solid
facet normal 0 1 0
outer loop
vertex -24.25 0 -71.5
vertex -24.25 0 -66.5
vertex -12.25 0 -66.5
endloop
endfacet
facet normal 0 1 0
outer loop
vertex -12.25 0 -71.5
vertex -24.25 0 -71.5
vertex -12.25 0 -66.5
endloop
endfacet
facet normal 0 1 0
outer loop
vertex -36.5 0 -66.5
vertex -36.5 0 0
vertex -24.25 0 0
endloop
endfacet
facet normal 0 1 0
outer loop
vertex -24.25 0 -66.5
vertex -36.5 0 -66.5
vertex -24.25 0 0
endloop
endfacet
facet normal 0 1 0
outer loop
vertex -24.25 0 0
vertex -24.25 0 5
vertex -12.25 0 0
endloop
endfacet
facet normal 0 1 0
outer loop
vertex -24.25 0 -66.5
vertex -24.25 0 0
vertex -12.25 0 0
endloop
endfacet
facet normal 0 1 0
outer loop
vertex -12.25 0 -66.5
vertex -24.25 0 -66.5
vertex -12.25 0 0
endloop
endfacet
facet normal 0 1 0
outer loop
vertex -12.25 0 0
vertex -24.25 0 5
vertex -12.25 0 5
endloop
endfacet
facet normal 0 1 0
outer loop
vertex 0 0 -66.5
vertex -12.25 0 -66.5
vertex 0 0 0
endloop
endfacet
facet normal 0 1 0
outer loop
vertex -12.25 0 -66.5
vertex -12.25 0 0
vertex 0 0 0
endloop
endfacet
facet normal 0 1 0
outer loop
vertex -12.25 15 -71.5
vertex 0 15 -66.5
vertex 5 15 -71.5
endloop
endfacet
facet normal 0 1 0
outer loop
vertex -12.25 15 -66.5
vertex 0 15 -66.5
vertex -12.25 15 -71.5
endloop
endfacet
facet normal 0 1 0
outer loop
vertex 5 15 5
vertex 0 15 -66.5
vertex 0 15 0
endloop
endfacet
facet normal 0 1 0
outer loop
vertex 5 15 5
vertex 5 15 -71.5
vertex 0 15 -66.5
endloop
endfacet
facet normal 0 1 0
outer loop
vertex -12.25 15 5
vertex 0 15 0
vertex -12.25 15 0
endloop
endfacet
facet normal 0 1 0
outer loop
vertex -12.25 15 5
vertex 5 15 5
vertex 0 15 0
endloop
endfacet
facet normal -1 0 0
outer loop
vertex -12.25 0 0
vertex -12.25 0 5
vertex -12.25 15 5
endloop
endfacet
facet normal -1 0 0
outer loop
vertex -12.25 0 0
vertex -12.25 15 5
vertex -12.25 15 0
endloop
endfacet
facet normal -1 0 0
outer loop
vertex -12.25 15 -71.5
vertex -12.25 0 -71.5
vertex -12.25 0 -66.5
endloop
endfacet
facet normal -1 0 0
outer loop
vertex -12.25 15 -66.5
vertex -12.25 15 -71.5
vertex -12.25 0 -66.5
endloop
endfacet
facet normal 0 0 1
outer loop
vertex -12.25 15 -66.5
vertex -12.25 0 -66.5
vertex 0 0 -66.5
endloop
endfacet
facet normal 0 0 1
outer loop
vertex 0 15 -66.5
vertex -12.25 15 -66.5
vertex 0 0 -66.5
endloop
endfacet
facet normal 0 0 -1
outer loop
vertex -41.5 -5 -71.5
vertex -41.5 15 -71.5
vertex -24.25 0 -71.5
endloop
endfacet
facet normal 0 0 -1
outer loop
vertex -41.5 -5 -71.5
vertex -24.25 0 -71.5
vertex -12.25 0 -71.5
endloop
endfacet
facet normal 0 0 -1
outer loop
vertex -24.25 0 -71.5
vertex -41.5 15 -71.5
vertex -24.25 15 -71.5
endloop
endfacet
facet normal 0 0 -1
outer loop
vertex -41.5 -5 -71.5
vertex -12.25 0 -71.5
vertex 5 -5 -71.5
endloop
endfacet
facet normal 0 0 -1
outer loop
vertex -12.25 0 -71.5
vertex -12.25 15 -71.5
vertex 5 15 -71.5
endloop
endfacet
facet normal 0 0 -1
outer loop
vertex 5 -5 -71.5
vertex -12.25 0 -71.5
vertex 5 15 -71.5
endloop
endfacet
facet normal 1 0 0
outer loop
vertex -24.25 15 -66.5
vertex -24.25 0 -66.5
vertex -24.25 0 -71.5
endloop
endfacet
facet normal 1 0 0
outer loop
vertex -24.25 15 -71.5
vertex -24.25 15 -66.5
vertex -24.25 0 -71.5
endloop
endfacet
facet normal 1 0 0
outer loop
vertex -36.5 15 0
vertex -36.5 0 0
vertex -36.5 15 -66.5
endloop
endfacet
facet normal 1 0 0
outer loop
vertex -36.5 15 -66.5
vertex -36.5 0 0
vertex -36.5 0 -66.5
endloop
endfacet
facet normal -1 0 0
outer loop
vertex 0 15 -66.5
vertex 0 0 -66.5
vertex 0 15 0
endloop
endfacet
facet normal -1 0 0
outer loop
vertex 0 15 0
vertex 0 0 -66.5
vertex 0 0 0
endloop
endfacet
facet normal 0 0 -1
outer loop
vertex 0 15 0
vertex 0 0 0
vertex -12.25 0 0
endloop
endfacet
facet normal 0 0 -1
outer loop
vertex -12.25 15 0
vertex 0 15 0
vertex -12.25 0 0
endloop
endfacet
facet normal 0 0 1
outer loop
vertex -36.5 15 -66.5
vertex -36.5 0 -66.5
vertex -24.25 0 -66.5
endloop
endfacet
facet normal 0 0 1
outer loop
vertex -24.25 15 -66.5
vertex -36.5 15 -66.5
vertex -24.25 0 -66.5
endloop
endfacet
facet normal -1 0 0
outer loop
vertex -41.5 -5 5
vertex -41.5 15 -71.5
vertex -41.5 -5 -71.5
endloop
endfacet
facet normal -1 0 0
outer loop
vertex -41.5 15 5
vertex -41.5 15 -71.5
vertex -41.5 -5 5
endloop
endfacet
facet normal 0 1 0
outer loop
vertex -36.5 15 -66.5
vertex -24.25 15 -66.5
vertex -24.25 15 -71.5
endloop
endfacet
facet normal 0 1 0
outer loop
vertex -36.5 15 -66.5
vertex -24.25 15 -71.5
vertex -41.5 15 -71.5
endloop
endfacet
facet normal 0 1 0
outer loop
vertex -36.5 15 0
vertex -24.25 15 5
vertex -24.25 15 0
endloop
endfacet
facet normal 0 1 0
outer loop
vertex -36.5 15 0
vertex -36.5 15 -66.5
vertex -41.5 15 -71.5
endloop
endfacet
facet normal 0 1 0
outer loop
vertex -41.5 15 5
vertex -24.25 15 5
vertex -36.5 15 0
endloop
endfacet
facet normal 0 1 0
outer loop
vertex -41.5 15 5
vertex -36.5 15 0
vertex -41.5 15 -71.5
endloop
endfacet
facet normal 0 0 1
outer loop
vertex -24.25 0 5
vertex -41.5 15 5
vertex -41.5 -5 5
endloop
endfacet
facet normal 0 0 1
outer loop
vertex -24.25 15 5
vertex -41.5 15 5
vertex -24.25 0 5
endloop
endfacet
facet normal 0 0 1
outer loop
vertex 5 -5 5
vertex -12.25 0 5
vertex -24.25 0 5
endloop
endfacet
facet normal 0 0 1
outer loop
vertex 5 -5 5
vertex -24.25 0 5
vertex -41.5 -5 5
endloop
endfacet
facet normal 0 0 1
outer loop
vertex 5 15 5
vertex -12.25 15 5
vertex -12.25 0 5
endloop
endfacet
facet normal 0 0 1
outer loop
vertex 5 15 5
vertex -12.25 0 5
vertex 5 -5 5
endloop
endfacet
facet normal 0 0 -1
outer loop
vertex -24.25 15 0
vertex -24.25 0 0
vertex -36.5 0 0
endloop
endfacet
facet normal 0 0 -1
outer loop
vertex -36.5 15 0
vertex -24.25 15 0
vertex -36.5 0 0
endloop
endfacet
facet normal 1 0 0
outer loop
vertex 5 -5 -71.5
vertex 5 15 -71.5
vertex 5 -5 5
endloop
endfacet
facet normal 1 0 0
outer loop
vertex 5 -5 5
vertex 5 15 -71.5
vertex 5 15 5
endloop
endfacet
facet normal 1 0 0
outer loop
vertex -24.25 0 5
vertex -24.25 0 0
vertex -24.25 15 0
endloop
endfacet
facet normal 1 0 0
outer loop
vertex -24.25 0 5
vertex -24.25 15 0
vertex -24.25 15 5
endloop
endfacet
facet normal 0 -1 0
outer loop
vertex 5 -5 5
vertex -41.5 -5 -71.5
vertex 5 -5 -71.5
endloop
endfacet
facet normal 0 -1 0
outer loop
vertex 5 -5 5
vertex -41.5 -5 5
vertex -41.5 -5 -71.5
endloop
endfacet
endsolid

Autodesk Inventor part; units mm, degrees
ref_plane "YZ Plane" through (0, 0, 0) normal (1, 0, 0) x (0, 1, 0)
ref_plane "XZ Plane" through (0, 0, 0) normal (0, 1, 0) x (-1, 0, 0)
ref_plane "XY Plane" through (0, 0, 0) normal (0, 0, 1) x (1, 0, 0)
sketch "Sketch1" plane through (0, 0, 0) normal (0, 1, 0) x (-1, 0, 0)
  line L0 (0, 0) -> (36.5, 0)
  line L1 (36.5, 0) -> (36.5, -66.5)
  line L2 (36.5, -66.5) -> (0, -66.5)
  line L3 (0, -66.5) -> (0, 0)
  line L4 (41.5, 5) -> (-5, 5)
  line L5 (-5, 5) -> (-5, -71.5)
  line L6 (-5, -71.5) -> (41.5, -71.5)
  line L7 (41.5, -71.5) -> (41.5, 5)
  line L8 (18.25, 5) -> (24.25, 5)
  line L9 (18.25, -71.5) -> (24.25, -71.5)
  line L10 (24.25, 5) -> (12.25, 5)
  line L11 (12.25, 5) -> (12.25, 0)
  line L12 (12.25, 0) -> (24.25, 0)
  line L13 (24.25, 0) -> (24.25, 5)
  line L14 (24.25, -71.5) -> (12.25, -71.5)
  line L15 (12.25, -71.5) -> (12.25, -66.5)
  line L16 (12.25, -66.5) -> (24.25, -66.5)
  line L17 (24.25, -66.5) -> (24.25, -71.5)
  dimension "d0" = 36.5
  dimension "d1" = 66.5
  dimension "d2" = 5
  dimension "d3" = 6
  dimension "d4" = 6
  dimension "d5" = 12
  dimension "d6" = 12
extrude "Extrusion1" add sketch "Sketch1" along normal blind 15 contours L3 L2 L15 L6 L5 L4 L11 L0 | L13 L4 L7 L6 L17 L2 L1 L0
sketch "Sketch2" plane through (0, 0, 0) normal (0, -1, 0) x (1, 0, 0)
  line L0 (-12.25, 5) -> (5, 5) projected
  line L1 (-41.5, -71.5) -> (-41.5, 5) projected
  line L2 (5, 5) -> (-41.5, 5)
  line L3 (-41.5, 5) -> (-41.5, -71.5)
  line L4 (-41.5, -71.5) -> (5, -71.5)
  line L5 (5, -71.5) -> (5, 5)
  point P0 (0, 0)
extrude "Extrusion2" add sketch "Sketch2" along normal blind 5
sketch "Sketch3" plane through (0, 15, 0) normal (0, 1, 0) x (1, 0, 0)
  line L0 (5, -5) -> (-41.5, -5) projected
  line L1 (-24.25, -5) -> (-24.25, 0) projected
  line L2 (-41.5, -5) -> (-24.25, -5)
  line L3 (-24.25, -5) -> (-24.25, 0)
  line L4 (-24.25, 0) -> (-36.5, 0) projected
  line L5 (-24.25, 0) -> (-36.5, 0)
  line L6 (-36.5, 0) -> (-36.5, 66.5) projected
  line L7 (-36.5, 0) -> (-36.5, 66.5)
  line L8 (-36.5, 66.5) -> (-24.25, 66.5)
  line L9 (-24.25, 66.5) -> (-24.25, 71.5)
  line L10 (-41.5, 71.5) -> (5, 71.5) projected
  line L11 (-41.5, -5) -> (-41.5, 71.5) projected
  line L12 (-41.5, 71.5) -> (-24.25, 71.5)
  line L13 (-41.5, 71.5) -> (-41.5, -5)
  line L14 (-12.25, 0) -> (-12.25, -5) projected
  line L15 (-12.25, -5) -> (5, -5)
  line L16 (5, -5) -> (5, 71.5) projected
  line L17 (5, -5) -> (5, 71.5)
  line L18 (5, 71.5) -> (-12.25, 71.5)
  line L19 (-12.25, 71.5) -> (-12.25, 66.5) projected
  line L20 (-12.25, 66.5) -> (-12.25, 71.5)
  line L21 (0, 0) -> (-12.25, 0) projected
  line L22 (-12.25, -5) -> (-12.25, 0)
  line L23 (-12.25, 0) -> (0, 0)
  line L24 (0, 66.5) -> (0, 0) projected
  line L25 (0, 0) -> (0, 66.5)
  line L26 (-12.25, 66.5) -> (0, 66.5) projected
  line L27 (0, 66.5) -> (-12.25, 66.5)
properties part number "voltage buckboost cover"
